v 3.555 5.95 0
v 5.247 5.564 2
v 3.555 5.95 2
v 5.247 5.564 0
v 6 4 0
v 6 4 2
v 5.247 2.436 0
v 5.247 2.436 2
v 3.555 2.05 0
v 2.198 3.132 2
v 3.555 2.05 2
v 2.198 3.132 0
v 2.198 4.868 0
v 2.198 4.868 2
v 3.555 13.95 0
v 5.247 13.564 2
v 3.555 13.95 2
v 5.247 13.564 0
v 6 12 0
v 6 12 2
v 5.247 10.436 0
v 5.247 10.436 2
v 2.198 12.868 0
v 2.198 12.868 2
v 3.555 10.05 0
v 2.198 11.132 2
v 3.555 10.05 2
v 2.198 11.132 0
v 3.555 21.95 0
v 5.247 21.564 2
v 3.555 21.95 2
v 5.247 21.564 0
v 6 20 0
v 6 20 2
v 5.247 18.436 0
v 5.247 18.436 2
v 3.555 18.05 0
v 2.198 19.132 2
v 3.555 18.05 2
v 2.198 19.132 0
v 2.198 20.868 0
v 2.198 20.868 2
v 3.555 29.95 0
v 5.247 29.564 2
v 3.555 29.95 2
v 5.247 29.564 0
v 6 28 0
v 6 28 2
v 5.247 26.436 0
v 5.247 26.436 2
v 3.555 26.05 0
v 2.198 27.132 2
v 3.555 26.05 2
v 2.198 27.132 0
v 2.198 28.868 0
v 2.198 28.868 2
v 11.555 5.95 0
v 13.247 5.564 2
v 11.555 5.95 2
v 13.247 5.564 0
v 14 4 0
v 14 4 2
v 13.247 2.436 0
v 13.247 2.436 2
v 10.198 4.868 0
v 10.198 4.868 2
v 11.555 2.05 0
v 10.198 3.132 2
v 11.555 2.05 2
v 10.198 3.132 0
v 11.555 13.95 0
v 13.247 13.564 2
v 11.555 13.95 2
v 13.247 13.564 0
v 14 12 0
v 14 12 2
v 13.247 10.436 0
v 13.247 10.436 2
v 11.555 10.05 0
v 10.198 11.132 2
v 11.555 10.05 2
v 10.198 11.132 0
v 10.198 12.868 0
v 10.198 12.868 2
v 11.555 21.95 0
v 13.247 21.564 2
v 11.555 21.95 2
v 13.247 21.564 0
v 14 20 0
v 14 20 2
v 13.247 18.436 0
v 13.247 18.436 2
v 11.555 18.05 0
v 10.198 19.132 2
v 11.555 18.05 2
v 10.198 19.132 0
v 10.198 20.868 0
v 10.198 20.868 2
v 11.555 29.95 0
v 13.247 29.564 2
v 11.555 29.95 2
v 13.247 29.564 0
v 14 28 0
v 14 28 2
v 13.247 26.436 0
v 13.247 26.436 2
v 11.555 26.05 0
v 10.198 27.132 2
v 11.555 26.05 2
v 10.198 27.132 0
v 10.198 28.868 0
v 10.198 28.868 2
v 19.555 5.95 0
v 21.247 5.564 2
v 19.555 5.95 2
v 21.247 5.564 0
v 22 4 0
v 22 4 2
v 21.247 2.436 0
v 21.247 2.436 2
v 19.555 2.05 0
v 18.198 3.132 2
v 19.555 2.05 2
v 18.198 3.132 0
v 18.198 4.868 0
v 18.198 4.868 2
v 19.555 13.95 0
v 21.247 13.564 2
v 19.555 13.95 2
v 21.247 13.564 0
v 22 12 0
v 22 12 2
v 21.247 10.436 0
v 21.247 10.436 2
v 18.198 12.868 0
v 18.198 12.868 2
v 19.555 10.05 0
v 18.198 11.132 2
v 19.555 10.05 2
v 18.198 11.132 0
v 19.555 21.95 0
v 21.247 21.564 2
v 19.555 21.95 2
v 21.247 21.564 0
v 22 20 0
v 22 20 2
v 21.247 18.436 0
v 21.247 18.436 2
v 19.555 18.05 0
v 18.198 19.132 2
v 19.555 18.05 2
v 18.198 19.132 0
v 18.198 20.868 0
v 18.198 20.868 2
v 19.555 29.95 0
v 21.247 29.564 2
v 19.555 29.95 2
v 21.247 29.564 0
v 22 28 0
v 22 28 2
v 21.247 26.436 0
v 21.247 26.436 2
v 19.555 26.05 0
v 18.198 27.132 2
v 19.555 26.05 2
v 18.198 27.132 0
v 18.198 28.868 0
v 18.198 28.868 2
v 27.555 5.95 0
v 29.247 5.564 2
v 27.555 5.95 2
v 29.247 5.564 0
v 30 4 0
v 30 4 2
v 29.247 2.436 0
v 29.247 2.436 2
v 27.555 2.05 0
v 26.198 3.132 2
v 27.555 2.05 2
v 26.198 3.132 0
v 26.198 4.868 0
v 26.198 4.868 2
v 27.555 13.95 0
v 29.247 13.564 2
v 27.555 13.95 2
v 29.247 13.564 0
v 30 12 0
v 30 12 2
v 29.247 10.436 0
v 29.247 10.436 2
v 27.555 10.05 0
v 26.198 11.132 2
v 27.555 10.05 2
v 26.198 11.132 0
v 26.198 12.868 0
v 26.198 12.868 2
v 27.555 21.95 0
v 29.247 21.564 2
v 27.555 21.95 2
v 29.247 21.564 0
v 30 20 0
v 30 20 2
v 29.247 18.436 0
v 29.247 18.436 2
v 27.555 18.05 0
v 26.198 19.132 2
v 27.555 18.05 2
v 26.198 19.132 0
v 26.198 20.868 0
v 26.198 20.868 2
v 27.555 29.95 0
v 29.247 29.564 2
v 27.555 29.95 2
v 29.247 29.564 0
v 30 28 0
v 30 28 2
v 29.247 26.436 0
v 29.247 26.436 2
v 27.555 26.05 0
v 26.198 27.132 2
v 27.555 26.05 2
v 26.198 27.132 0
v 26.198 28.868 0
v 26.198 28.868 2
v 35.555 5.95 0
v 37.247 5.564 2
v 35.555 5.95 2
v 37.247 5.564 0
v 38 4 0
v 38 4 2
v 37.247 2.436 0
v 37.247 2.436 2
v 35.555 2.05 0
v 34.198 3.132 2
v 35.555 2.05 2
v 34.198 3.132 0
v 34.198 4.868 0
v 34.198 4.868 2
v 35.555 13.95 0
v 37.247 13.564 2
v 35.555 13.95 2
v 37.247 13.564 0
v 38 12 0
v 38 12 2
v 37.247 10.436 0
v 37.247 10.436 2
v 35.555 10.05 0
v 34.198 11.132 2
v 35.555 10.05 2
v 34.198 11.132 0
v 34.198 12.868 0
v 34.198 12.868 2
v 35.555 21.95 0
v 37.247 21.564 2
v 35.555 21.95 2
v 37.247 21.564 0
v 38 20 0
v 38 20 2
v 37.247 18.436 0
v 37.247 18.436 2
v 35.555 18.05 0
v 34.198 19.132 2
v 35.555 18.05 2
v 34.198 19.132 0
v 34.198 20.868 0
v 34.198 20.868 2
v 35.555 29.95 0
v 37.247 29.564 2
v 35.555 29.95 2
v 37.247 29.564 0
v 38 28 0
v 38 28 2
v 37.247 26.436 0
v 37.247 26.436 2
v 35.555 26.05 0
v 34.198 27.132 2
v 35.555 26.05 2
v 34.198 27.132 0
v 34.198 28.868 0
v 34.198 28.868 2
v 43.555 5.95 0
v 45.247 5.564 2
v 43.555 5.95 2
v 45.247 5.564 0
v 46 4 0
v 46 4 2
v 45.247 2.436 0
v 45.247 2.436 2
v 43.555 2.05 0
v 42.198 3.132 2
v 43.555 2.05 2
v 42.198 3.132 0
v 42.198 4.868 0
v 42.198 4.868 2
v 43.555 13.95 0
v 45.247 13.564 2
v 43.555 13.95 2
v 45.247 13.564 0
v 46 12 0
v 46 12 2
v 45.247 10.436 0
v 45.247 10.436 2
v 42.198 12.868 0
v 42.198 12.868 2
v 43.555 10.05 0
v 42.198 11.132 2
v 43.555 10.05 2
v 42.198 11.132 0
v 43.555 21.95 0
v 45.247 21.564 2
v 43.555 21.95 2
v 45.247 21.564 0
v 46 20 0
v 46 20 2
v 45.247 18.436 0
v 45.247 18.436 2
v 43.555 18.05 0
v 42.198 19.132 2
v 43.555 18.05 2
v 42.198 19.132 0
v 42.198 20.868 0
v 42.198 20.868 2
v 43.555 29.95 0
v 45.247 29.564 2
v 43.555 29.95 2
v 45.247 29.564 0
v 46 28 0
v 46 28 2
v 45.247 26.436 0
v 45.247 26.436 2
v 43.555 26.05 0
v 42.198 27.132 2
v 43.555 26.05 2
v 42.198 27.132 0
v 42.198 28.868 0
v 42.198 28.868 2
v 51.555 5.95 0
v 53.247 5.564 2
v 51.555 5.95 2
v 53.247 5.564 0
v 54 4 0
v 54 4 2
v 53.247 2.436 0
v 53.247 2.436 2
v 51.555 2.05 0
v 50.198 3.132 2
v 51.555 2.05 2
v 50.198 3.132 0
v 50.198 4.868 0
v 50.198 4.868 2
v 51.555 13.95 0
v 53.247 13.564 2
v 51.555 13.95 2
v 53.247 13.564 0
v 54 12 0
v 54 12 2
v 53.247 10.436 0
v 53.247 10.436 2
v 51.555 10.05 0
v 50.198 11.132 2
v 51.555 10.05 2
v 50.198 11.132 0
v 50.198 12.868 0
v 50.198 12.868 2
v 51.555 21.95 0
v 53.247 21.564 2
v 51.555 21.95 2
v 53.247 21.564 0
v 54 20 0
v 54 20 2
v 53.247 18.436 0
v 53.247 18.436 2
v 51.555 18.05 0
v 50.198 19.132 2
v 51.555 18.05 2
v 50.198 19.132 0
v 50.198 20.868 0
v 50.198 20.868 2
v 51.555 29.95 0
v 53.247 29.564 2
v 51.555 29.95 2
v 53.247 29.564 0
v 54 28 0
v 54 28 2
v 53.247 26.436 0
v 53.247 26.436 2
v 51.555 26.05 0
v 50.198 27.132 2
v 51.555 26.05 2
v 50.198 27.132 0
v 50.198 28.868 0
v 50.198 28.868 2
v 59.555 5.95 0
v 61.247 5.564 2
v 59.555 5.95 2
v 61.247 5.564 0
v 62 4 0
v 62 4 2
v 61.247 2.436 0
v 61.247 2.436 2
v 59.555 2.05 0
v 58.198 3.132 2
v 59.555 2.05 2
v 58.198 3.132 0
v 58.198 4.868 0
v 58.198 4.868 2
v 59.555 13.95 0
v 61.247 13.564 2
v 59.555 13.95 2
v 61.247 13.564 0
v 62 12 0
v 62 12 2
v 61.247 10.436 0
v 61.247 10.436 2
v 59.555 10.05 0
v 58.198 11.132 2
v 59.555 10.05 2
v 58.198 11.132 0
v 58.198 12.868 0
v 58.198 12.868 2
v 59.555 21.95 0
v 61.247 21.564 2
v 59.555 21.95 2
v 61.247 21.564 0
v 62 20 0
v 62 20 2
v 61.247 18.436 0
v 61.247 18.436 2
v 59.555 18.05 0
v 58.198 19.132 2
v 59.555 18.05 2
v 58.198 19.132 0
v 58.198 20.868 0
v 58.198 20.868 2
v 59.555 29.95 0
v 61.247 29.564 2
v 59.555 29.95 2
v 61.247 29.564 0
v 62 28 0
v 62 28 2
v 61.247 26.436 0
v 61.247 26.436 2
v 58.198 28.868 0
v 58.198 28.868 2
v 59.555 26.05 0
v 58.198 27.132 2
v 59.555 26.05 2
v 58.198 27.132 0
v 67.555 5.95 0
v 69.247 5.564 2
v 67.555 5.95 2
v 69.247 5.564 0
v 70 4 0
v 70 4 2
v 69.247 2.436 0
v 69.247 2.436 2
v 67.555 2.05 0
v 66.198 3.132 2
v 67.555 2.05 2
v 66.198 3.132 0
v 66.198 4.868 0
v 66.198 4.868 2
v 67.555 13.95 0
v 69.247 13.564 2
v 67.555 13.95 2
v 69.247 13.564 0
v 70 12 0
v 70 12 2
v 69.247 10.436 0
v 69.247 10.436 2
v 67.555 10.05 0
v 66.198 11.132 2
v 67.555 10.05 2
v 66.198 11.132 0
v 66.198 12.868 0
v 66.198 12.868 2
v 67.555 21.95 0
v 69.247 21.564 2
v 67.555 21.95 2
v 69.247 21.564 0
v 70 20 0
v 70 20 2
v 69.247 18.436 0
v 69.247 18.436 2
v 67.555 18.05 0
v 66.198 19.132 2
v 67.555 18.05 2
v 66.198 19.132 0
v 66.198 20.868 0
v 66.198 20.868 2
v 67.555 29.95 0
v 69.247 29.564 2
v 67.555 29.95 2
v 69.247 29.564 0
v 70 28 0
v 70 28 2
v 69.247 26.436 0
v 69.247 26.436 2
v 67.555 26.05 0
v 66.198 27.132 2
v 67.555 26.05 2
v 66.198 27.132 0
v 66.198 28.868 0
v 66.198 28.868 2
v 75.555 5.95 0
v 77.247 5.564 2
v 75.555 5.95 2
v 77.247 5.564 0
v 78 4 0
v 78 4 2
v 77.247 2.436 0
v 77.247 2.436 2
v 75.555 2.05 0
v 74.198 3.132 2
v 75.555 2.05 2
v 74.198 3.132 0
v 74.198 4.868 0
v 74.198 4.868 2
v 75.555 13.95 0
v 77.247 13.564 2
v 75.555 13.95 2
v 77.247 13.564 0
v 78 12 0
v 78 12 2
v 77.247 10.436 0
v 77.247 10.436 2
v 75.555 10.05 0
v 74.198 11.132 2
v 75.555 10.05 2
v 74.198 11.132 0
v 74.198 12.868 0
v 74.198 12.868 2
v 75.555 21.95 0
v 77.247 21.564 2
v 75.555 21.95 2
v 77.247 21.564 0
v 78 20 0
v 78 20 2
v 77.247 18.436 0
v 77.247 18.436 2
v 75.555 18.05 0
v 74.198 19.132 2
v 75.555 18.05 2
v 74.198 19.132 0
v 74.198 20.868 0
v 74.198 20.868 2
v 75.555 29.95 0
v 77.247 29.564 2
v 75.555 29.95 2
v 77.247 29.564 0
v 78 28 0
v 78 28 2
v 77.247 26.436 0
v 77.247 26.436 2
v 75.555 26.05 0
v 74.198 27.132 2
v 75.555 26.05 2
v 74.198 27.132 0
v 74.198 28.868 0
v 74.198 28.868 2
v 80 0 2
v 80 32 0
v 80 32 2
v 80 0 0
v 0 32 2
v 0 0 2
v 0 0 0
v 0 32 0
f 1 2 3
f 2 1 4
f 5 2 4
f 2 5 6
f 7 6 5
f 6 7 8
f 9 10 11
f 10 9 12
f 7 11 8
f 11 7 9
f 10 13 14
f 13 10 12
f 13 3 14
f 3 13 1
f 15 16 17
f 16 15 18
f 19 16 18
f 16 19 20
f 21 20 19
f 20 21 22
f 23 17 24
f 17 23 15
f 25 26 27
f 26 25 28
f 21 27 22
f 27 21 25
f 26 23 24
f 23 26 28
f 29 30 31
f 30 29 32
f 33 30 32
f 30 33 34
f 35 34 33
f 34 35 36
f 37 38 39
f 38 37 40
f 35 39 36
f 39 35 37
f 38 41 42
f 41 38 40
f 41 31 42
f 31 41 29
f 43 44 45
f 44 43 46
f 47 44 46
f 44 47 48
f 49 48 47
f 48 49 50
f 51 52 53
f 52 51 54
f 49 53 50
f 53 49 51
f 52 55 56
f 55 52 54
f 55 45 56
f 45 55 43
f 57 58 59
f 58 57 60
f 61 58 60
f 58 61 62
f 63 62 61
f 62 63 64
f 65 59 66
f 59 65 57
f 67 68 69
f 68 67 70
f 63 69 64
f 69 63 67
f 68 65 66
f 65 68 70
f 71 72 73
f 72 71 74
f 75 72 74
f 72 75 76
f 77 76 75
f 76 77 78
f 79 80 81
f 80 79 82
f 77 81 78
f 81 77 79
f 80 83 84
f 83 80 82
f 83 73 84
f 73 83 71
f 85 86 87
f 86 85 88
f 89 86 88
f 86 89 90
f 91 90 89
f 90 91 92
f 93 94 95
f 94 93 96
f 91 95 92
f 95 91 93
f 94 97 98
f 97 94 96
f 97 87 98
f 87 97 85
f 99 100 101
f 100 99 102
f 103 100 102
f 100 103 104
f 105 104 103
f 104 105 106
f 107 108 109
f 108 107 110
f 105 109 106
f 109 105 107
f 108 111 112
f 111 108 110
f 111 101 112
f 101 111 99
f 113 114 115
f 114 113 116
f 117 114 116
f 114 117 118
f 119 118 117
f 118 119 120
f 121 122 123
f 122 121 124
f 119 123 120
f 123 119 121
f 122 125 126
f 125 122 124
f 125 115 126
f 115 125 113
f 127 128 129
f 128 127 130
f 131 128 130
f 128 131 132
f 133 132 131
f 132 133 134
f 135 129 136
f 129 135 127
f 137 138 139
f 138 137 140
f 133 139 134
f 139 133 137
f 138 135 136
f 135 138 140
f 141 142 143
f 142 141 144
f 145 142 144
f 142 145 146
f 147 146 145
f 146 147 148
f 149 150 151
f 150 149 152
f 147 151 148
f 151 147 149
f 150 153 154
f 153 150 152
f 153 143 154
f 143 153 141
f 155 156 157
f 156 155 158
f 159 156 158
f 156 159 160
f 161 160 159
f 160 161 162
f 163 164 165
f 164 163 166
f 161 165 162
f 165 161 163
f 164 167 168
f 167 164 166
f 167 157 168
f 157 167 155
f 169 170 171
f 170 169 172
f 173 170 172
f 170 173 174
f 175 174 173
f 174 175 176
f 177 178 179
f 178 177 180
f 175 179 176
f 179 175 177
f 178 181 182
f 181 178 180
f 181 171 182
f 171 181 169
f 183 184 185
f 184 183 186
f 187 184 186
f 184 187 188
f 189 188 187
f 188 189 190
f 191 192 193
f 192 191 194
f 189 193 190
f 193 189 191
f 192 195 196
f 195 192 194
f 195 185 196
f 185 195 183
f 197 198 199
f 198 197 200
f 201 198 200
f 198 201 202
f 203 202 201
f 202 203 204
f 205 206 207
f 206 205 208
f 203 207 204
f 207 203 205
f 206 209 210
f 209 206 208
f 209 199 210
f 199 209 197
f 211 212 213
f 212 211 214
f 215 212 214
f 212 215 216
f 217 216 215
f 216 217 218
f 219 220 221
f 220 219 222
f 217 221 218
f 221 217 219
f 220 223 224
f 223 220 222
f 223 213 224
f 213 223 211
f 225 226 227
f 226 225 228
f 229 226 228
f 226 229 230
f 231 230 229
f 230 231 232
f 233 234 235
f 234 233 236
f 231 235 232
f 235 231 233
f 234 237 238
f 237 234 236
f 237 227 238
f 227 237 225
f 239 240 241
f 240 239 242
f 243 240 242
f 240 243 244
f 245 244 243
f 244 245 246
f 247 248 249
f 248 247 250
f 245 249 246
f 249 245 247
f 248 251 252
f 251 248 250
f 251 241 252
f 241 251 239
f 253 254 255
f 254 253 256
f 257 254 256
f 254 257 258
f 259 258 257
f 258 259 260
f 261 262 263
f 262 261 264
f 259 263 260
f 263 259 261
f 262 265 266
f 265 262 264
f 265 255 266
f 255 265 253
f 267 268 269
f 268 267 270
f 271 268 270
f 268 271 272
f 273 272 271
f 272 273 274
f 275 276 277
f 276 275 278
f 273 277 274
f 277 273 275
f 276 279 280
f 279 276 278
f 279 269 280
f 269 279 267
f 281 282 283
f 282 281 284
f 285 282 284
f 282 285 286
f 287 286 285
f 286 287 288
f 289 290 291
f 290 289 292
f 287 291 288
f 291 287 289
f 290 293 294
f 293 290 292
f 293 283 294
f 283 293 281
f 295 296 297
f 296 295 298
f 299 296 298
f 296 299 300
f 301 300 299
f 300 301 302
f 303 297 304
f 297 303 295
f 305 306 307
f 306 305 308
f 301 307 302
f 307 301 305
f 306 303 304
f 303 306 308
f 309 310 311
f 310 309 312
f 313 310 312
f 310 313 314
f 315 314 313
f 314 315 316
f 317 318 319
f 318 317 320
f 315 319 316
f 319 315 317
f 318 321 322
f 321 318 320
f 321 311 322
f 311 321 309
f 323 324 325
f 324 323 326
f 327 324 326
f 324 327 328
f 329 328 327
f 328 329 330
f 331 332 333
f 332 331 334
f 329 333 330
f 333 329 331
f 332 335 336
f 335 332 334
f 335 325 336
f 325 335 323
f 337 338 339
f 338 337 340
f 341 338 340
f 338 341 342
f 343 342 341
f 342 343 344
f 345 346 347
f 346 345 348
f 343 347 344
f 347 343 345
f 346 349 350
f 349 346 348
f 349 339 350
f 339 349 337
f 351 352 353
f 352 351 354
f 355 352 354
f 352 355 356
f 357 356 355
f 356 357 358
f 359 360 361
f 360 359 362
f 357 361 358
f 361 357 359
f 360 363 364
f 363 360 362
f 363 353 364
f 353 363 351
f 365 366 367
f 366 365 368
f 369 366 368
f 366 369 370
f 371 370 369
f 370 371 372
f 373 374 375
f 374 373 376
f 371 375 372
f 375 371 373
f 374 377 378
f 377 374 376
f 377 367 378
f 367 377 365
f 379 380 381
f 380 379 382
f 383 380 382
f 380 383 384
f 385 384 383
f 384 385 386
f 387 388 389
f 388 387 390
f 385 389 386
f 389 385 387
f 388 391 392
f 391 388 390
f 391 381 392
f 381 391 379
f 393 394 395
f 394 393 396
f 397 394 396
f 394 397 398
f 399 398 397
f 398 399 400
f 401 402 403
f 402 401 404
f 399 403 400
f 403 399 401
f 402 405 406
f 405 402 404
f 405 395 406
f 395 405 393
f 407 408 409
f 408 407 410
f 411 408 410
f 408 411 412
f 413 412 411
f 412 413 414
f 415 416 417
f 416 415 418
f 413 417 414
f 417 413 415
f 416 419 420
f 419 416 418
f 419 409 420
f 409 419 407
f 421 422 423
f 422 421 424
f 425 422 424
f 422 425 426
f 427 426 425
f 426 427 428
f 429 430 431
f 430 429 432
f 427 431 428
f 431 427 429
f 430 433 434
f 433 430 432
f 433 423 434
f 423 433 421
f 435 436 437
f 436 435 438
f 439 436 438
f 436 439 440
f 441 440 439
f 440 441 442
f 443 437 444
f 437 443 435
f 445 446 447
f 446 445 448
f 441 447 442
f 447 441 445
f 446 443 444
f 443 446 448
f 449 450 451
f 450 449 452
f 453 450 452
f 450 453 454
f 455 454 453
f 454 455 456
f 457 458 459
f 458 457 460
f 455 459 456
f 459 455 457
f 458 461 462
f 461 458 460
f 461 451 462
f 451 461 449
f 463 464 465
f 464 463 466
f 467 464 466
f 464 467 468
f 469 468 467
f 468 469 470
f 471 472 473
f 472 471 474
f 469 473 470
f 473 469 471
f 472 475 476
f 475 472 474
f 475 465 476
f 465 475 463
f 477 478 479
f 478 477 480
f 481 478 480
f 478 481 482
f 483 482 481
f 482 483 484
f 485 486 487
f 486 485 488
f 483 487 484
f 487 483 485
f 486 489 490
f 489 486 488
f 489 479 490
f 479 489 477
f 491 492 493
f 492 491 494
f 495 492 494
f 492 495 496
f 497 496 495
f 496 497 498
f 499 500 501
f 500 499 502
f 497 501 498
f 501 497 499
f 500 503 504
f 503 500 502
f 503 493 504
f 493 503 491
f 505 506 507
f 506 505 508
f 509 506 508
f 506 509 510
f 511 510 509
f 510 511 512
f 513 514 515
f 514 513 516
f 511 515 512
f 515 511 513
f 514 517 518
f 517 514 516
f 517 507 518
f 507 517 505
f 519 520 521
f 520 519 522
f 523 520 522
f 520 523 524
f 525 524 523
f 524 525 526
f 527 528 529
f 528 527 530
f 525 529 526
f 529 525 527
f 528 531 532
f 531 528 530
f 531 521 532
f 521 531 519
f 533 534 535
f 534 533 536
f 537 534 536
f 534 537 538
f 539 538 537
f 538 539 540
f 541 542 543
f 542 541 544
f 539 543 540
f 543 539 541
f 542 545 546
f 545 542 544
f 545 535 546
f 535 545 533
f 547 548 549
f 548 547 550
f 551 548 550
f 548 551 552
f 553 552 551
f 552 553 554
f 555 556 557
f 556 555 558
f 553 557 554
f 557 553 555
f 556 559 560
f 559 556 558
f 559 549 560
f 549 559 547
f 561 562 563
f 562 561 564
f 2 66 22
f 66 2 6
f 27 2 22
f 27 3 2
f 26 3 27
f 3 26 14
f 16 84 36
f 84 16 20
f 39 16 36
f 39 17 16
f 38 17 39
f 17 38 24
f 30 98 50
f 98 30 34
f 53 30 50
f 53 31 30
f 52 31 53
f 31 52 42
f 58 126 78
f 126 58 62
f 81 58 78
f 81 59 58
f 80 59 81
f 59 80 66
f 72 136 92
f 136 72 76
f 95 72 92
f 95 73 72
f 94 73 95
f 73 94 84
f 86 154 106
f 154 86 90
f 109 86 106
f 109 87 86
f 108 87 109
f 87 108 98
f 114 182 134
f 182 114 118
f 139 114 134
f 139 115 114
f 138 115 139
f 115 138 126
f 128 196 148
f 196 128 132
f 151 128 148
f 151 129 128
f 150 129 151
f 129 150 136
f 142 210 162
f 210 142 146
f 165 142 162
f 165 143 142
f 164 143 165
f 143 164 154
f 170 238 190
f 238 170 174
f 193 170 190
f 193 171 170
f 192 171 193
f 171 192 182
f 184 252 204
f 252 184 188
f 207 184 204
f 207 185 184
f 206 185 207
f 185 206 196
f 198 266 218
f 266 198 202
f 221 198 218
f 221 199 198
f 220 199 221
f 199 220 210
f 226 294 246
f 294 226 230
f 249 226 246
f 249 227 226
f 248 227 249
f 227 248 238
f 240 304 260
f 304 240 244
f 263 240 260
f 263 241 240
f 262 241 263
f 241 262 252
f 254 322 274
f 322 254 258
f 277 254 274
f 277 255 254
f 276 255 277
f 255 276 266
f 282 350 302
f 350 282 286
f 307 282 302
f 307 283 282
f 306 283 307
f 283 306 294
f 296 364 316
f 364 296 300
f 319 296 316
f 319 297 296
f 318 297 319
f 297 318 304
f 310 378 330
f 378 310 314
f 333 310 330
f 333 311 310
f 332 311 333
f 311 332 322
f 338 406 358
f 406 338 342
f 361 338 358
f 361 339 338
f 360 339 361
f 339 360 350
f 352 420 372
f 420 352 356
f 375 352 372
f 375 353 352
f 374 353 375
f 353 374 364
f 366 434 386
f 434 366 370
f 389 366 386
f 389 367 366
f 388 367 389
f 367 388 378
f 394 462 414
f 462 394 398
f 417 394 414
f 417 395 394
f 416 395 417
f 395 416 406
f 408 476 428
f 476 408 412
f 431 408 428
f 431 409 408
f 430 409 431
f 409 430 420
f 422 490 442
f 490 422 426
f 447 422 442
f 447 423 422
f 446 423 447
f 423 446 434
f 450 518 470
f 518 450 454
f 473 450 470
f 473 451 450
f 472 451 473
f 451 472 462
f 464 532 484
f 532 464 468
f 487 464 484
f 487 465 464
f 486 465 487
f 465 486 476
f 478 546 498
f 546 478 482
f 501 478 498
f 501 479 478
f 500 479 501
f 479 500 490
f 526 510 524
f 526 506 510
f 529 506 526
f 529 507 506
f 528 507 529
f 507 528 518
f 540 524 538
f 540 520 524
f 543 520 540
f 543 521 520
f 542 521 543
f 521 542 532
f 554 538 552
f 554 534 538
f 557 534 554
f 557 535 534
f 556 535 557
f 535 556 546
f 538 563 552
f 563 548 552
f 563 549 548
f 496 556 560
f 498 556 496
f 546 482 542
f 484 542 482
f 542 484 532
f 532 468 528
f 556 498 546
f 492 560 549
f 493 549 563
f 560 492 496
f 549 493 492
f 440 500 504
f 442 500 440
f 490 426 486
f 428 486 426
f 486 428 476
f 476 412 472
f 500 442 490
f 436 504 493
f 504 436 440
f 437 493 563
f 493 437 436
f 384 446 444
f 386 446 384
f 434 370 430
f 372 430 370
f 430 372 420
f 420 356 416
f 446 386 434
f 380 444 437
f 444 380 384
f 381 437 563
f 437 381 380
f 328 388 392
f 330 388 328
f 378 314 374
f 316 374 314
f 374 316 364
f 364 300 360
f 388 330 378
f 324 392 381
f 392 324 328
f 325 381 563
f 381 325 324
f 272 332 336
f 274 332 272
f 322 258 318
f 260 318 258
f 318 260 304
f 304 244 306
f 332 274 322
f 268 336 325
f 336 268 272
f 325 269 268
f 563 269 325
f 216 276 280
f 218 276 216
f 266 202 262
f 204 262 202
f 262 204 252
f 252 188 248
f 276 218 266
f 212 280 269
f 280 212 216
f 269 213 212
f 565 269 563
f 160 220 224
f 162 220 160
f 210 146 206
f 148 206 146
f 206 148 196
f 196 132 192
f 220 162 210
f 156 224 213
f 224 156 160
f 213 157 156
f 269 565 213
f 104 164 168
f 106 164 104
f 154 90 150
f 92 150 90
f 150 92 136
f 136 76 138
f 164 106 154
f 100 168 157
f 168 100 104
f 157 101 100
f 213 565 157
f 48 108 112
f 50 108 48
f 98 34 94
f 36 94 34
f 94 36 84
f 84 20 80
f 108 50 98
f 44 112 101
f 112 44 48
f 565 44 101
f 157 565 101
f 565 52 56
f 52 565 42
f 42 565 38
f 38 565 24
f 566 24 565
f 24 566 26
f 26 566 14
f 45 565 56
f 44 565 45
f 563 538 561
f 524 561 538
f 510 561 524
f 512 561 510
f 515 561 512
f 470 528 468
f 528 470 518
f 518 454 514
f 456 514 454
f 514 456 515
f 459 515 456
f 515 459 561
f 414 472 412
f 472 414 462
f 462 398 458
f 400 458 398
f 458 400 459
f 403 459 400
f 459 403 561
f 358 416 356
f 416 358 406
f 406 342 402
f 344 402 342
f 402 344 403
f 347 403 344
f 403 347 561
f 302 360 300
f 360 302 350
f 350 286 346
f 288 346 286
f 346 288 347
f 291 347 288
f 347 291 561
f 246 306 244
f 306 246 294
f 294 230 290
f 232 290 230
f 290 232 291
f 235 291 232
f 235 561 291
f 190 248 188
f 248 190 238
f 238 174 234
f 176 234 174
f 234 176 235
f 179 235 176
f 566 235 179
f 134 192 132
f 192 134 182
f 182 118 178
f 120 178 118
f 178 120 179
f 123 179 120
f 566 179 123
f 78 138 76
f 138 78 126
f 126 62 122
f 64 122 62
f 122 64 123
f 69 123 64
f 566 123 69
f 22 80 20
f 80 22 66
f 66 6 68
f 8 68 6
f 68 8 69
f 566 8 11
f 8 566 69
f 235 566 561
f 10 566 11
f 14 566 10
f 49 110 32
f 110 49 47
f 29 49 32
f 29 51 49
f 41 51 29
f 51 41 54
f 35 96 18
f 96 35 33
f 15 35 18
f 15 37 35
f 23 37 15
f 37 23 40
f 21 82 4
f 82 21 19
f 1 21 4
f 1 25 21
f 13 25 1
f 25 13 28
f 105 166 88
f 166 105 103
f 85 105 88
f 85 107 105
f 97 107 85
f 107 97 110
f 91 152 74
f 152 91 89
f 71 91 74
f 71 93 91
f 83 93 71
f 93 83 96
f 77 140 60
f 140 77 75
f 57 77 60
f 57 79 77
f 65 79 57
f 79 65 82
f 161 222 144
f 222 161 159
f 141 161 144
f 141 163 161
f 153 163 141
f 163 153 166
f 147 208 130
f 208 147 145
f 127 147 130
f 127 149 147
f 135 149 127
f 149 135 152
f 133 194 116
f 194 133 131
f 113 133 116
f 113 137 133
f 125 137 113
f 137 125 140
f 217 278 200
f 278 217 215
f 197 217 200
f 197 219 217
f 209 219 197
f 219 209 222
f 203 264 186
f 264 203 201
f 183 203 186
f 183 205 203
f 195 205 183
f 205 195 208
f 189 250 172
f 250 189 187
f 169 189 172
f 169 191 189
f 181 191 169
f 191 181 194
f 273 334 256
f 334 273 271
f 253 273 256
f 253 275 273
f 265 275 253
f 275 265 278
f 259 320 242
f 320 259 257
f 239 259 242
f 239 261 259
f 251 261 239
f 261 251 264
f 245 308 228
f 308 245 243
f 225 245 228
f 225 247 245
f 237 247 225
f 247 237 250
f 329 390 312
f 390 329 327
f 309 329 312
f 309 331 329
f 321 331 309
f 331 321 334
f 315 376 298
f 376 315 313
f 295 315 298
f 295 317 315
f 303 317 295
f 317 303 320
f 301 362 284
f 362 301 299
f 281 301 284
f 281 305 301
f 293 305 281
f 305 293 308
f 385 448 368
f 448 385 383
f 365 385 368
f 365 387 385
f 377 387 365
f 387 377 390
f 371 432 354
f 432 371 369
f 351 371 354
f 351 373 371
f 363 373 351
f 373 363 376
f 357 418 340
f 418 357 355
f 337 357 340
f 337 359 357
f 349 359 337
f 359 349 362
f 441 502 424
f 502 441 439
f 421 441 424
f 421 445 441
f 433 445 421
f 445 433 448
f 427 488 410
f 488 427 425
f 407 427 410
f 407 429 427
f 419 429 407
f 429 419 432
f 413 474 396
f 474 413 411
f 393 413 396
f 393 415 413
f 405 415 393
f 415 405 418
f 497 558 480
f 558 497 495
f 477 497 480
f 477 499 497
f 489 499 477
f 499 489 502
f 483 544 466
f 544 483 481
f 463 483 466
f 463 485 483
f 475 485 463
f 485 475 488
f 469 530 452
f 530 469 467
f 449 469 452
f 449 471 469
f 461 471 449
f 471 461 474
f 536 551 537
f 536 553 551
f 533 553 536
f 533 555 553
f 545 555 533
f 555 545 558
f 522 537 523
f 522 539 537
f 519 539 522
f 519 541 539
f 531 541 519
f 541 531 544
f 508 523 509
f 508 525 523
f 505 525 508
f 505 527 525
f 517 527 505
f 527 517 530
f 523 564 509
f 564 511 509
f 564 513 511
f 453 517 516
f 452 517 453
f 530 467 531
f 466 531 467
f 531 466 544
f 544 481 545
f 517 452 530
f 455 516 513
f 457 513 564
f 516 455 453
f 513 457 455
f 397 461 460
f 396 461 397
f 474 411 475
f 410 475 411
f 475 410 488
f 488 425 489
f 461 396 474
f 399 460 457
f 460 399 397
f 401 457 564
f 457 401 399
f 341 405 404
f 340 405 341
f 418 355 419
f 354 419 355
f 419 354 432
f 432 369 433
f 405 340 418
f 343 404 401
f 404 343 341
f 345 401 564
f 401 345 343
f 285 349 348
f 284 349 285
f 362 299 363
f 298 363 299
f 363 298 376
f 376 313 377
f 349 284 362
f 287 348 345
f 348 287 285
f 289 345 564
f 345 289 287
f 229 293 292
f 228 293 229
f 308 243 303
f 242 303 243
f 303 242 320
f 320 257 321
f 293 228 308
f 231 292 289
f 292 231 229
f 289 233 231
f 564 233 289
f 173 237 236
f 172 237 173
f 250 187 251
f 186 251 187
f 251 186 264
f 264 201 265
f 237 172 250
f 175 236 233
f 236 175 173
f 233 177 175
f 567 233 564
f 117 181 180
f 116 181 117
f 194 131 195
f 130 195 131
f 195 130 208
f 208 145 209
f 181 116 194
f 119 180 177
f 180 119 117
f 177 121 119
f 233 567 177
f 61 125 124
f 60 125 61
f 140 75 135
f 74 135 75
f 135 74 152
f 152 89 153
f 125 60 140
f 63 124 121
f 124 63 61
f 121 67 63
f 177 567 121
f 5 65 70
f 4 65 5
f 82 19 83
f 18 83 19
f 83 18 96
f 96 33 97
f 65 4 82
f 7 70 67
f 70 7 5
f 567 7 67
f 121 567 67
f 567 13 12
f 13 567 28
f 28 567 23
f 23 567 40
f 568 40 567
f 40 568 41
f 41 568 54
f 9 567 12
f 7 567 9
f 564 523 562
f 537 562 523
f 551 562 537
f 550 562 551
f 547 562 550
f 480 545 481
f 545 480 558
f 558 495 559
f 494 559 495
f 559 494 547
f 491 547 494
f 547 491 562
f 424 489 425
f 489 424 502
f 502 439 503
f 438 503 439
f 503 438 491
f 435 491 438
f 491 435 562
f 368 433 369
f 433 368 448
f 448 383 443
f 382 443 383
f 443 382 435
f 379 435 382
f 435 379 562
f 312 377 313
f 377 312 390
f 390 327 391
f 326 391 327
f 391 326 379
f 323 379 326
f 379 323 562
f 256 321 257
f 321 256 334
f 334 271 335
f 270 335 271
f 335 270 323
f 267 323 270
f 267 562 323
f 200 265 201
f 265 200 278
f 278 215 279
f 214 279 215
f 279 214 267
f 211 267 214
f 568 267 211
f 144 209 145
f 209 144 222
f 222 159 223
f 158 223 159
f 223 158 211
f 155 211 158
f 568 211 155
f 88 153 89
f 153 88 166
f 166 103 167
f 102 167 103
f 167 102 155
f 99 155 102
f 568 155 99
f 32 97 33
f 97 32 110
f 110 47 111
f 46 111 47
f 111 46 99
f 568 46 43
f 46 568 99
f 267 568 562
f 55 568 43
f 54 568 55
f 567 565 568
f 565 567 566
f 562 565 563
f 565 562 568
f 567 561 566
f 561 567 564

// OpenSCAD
rangees_longueur = 10;
rangees_largeur =4;
epaisseur = 2;
difference(){
cube([rangees_longueur*8, rangees_largeur*8,epaisseur]);

union(){
for(i = [0:rangees_longueur]){
    for(j=[0: rangees_largeur]){
        translate([4+i*8, 4+j*8, -1]){
            cylinder(h=epaisseur+2, r= 2);
            }
        }
    }
}
}
